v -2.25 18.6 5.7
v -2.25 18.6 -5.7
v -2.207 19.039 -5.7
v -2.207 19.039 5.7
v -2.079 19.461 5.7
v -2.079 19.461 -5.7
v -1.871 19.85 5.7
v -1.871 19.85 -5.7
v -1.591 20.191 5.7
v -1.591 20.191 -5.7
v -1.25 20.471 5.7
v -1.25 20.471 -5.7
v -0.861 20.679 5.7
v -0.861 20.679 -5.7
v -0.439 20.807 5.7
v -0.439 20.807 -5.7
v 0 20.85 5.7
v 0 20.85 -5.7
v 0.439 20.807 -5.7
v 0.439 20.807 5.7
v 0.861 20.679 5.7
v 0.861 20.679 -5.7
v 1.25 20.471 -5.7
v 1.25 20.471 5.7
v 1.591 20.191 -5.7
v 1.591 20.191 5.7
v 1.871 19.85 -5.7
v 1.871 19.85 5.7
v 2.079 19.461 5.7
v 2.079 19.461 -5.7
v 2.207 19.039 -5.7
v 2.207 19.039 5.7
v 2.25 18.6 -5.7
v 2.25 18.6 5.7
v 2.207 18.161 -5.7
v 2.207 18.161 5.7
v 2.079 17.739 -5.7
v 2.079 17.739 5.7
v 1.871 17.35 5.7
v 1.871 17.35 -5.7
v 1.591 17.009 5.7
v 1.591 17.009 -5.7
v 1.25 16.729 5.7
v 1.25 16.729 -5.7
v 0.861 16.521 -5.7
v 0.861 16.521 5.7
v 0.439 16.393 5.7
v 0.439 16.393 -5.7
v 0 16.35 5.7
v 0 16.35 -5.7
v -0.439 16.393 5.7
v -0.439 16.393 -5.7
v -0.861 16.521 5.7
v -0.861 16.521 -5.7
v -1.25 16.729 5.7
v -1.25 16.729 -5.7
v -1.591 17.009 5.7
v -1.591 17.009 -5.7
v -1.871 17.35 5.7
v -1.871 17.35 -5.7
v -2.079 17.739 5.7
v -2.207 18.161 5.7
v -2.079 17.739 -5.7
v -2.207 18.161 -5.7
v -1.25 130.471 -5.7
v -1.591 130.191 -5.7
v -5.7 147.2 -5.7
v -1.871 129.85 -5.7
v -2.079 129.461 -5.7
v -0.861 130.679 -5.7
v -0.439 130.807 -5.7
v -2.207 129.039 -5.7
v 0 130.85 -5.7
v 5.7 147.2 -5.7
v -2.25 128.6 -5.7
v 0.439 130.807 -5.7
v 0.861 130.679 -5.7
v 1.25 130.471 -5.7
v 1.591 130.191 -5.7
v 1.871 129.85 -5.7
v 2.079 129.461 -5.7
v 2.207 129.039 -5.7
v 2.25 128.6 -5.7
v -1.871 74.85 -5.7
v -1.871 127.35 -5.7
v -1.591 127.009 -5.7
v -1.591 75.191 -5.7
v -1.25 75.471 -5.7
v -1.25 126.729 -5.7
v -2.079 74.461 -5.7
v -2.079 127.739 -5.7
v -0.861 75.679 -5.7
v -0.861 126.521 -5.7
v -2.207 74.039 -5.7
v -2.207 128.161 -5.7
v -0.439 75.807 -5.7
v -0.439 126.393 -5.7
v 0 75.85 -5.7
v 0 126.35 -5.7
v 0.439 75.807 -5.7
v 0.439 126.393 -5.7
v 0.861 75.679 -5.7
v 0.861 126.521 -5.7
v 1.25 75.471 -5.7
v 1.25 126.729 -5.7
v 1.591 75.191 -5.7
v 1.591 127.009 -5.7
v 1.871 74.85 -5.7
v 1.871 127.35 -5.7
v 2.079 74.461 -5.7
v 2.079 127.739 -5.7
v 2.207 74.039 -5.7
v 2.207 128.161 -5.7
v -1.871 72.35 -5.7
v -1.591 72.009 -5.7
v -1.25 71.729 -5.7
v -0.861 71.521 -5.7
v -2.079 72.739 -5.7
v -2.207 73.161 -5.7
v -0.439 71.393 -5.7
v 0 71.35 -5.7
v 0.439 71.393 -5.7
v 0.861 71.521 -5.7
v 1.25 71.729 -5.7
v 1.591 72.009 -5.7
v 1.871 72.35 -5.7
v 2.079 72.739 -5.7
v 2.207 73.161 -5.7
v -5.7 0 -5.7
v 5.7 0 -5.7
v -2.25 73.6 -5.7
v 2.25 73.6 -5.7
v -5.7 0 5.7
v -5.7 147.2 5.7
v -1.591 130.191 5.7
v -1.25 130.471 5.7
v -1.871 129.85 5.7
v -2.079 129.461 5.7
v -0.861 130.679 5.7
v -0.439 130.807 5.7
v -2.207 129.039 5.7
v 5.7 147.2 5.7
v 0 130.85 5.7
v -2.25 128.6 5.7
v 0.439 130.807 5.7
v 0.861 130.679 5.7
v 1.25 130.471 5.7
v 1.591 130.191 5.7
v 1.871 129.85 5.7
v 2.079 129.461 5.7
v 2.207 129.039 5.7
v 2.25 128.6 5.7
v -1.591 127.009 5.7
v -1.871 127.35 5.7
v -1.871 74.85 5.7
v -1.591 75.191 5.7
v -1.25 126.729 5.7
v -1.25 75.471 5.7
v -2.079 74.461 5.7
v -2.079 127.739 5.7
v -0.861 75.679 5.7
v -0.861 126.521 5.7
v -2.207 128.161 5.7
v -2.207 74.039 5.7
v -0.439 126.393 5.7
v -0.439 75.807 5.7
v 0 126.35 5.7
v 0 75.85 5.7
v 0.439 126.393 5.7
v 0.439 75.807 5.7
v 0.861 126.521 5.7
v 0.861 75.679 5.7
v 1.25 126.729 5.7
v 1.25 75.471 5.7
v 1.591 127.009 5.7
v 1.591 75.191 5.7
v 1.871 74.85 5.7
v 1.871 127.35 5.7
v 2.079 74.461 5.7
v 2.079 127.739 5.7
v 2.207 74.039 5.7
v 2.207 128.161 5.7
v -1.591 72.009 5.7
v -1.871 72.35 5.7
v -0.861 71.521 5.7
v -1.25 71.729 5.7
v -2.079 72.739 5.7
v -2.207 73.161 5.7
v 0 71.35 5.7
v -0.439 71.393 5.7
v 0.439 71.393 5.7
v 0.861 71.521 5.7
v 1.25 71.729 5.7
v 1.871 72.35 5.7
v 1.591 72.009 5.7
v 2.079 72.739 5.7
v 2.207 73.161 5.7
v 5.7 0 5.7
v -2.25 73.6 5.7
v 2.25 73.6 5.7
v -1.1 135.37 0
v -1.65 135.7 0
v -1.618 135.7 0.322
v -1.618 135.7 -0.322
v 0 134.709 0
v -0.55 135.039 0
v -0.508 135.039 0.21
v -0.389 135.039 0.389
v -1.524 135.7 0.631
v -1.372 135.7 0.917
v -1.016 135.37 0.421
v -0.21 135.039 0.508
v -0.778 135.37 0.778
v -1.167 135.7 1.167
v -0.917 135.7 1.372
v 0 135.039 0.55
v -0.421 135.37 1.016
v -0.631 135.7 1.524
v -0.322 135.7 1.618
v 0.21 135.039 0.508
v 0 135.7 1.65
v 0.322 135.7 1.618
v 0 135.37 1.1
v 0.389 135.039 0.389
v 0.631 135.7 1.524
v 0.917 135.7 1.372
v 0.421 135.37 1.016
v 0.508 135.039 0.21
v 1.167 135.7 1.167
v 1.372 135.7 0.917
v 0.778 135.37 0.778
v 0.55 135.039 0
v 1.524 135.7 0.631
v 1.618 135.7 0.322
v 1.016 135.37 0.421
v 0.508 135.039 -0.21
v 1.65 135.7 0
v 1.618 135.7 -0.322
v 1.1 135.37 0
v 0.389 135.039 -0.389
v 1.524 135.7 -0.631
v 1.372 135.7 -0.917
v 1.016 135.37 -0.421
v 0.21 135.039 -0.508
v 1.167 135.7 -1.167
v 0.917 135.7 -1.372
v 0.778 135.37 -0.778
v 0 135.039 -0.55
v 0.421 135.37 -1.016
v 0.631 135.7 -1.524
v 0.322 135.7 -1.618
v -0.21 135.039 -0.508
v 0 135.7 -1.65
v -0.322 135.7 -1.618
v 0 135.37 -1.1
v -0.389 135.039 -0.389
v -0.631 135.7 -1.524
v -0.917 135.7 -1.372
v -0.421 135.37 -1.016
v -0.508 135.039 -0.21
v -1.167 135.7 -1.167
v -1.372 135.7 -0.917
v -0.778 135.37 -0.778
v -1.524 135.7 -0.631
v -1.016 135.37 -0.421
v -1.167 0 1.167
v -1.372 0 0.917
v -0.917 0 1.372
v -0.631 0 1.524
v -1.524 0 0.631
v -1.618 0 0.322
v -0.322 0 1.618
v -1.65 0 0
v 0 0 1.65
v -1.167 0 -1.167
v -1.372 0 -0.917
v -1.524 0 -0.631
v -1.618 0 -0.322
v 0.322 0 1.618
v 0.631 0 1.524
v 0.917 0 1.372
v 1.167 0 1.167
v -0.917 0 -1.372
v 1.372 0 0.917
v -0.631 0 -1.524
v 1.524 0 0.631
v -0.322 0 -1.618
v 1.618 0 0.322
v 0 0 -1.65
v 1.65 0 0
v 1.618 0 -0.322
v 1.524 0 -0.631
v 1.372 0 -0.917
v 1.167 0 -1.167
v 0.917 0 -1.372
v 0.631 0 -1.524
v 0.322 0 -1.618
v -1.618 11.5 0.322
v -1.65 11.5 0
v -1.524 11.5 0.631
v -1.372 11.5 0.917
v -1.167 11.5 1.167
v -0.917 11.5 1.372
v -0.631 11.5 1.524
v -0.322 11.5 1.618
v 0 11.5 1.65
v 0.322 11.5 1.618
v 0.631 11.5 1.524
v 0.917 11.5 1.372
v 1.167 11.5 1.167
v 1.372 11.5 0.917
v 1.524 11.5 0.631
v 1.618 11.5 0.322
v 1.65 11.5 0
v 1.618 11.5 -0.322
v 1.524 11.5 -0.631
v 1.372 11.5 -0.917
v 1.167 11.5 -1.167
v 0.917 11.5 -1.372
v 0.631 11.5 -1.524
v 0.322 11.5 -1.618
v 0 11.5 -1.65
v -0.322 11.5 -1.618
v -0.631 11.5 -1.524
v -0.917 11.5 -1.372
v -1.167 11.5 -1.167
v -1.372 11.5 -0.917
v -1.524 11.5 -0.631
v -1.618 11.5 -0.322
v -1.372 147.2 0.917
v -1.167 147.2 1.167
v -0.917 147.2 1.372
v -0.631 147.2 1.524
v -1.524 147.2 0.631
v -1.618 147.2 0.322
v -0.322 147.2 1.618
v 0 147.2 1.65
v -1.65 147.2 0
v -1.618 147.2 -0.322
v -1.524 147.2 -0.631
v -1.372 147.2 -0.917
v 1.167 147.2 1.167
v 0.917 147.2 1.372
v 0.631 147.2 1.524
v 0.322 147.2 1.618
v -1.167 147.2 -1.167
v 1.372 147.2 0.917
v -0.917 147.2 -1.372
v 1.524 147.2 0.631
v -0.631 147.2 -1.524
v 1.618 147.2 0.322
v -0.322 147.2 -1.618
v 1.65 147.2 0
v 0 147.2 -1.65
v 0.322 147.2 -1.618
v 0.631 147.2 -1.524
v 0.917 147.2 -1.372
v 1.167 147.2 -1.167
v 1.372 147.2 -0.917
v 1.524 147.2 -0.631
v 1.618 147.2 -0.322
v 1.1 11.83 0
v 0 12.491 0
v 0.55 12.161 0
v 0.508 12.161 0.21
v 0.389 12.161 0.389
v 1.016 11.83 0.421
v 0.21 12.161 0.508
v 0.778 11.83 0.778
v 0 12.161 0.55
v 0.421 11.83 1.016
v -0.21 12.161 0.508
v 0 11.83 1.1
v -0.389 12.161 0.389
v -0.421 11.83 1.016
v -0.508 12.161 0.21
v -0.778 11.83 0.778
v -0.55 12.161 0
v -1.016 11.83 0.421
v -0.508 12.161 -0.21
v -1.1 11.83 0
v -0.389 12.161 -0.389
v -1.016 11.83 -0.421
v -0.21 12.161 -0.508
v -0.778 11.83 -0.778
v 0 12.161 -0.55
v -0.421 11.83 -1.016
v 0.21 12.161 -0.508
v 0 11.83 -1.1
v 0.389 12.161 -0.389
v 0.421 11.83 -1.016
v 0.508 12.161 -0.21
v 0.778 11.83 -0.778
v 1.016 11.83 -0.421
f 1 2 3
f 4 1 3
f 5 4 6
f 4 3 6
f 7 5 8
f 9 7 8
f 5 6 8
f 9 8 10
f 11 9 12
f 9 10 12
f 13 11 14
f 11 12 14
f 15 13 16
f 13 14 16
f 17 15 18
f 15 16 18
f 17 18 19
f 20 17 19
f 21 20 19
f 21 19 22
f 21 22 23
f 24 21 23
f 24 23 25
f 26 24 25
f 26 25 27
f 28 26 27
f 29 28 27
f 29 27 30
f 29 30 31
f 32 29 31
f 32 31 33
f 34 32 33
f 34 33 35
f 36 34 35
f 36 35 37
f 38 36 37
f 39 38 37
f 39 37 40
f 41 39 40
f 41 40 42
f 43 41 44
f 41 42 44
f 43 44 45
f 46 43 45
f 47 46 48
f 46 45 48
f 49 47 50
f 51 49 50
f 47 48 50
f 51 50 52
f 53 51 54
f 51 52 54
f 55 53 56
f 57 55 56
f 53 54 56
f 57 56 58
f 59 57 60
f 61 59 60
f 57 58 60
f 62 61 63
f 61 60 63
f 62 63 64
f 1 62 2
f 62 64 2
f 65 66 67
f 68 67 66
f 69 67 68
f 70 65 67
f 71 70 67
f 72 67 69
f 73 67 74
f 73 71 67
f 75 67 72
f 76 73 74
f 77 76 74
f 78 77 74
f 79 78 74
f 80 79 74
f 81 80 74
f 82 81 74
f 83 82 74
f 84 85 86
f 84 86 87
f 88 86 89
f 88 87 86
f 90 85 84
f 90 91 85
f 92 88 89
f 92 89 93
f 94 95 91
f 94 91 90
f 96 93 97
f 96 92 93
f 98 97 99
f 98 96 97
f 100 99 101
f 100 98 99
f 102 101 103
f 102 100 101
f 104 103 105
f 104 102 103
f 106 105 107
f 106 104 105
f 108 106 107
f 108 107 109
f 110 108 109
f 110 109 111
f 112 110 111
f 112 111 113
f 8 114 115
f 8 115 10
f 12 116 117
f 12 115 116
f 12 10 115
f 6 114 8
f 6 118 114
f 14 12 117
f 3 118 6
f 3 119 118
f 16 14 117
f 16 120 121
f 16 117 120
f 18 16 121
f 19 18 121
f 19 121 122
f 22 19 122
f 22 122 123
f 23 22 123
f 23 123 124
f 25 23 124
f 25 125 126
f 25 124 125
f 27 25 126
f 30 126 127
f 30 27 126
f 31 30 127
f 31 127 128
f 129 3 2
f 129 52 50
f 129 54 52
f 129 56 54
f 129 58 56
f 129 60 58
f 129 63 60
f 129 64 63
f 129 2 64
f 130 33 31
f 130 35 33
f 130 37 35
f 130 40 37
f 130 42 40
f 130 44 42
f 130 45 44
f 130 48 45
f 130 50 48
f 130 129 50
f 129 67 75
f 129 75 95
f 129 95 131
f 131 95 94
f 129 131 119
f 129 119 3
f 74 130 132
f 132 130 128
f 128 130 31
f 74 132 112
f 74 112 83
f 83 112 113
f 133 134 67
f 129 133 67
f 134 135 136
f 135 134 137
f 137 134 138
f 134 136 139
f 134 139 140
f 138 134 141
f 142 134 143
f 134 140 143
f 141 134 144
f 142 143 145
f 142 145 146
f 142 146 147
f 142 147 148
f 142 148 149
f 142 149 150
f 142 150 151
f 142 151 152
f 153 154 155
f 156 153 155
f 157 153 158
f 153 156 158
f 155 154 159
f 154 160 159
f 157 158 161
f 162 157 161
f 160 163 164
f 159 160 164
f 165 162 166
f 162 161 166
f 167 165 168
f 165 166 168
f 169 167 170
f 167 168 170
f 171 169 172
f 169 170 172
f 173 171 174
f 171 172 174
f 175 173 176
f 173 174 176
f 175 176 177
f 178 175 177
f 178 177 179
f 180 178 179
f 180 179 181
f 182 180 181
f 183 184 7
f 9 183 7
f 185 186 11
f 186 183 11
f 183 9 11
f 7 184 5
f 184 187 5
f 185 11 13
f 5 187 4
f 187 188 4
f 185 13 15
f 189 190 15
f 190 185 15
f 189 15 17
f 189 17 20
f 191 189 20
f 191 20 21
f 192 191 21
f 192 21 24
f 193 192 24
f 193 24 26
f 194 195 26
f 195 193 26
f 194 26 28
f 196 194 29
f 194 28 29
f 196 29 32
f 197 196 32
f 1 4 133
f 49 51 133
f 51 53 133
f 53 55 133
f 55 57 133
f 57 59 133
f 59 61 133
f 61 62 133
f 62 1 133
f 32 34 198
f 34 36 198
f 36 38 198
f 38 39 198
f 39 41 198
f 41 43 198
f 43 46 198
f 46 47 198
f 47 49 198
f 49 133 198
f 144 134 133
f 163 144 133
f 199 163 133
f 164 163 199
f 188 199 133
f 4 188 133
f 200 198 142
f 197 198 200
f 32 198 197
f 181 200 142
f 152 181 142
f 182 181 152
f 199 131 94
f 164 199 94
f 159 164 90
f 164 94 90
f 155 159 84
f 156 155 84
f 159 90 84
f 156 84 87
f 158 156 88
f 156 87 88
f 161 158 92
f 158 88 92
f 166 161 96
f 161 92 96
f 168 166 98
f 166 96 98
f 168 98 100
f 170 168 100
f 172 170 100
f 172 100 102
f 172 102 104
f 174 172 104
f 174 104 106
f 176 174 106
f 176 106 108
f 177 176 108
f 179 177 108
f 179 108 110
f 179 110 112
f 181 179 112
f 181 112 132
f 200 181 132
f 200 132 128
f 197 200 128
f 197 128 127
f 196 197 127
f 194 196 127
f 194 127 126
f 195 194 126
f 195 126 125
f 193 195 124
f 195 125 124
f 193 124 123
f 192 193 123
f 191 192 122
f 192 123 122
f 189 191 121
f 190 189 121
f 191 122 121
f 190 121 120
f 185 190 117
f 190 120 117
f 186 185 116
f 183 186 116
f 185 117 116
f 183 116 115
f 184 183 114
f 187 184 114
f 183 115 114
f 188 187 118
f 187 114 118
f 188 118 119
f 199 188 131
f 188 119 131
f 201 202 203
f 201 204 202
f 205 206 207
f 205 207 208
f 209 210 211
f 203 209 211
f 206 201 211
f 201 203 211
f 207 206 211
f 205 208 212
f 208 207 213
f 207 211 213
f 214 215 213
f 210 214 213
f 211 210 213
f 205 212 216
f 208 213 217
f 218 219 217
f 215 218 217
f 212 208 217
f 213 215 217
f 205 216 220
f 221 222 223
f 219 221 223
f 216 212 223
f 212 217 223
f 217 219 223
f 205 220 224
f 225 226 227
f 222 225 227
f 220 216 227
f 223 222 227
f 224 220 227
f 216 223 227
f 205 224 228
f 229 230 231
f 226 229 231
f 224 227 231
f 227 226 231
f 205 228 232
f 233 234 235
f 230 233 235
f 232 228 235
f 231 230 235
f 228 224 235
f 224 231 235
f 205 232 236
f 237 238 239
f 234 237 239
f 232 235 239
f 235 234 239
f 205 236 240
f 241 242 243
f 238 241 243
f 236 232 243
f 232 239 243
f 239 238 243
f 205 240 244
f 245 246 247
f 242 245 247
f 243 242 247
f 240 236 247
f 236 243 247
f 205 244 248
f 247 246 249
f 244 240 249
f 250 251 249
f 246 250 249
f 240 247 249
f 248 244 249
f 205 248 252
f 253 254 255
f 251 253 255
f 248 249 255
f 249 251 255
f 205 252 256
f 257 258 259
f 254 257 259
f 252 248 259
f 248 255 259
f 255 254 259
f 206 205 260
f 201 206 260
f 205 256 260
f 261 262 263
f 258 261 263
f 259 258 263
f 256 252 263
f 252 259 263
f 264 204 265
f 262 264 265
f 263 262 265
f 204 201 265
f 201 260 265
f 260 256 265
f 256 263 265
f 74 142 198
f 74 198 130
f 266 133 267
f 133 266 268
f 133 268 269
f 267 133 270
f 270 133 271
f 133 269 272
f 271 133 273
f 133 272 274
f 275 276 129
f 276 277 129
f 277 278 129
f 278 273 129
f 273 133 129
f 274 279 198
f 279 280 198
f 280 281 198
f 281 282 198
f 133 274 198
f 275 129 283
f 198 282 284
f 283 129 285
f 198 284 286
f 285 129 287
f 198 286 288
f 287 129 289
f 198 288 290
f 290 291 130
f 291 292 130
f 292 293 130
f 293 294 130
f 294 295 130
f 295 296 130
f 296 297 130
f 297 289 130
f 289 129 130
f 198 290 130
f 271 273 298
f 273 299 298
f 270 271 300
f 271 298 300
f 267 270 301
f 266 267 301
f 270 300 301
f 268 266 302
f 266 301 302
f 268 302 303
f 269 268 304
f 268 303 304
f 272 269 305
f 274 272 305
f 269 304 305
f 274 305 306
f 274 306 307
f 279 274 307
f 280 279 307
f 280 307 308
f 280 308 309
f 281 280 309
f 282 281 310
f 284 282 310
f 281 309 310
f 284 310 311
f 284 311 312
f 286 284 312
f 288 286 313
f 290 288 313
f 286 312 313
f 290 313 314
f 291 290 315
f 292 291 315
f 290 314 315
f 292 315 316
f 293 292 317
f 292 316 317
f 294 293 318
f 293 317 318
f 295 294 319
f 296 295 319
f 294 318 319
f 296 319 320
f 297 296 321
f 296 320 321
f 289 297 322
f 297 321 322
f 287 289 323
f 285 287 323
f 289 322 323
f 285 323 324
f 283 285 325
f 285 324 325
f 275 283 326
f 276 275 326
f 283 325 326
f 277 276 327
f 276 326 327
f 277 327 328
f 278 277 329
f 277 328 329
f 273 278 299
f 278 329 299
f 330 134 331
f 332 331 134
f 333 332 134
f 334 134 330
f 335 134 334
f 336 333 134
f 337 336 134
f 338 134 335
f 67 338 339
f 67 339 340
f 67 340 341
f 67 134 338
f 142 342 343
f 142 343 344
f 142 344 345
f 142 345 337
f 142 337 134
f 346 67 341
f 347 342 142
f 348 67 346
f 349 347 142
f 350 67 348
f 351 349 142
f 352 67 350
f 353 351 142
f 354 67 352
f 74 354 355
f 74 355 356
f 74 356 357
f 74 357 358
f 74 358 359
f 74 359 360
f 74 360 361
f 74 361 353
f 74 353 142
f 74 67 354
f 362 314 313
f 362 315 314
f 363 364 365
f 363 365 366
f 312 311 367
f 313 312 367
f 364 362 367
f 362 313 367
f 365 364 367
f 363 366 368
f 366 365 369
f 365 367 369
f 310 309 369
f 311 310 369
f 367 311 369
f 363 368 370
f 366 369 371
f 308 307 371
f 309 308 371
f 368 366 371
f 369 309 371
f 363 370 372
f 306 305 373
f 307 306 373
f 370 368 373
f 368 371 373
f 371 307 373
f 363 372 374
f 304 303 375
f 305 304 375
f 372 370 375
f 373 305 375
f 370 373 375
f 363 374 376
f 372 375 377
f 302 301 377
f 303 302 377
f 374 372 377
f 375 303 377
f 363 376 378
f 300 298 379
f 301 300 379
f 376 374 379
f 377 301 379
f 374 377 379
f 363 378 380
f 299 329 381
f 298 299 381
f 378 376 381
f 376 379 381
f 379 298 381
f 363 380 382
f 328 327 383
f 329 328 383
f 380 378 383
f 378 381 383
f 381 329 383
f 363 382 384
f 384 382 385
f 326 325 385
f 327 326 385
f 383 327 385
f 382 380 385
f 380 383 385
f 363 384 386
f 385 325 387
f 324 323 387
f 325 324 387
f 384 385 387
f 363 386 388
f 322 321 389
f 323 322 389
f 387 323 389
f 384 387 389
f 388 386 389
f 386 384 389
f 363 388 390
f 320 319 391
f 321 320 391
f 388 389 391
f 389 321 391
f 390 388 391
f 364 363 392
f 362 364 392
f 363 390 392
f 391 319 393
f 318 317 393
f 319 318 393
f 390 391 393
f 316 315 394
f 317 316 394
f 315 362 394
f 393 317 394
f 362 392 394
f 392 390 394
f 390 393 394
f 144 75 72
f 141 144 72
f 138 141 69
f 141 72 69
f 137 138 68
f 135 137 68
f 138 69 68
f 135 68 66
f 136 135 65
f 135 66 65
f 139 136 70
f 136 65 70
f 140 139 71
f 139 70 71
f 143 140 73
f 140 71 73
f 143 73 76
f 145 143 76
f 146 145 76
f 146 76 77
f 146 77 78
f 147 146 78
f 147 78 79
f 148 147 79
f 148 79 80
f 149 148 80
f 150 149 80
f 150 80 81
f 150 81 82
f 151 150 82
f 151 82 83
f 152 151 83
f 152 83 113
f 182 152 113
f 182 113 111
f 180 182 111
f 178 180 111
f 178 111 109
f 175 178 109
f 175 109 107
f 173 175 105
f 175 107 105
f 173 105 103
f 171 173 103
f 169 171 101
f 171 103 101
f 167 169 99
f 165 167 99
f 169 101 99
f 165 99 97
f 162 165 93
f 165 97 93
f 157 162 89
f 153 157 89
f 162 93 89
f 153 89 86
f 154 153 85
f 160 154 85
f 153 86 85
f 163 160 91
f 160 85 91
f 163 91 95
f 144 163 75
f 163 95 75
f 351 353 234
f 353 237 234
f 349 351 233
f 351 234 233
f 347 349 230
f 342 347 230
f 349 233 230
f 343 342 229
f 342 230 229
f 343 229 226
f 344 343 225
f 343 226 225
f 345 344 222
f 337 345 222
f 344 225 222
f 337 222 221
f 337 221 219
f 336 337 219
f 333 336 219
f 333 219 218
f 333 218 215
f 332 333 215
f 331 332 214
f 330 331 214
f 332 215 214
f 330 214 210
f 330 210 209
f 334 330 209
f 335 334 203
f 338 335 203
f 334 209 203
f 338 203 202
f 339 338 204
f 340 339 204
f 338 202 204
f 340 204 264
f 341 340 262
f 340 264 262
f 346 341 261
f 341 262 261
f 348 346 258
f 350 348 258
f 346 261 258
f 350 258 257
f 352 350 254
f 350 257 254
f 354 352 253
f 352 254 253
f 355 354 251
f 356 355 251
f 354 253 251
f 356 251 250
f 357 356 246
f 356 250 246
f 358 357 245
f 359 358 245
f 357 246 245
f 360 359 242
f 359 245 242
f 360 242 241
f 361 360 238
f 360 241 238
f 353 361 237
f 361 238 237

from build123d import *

# Parameters (mm, degrees)
ESQUISSE1_W           = 11.4
ESQUISSE1_H           = 11.4
BOSS_EXTRU_1_DEPTH    = 147.2
TROU_TARAUD_M41_D     = 3.3
TROU_TARAUD_M41_DEPTH = 11.5
TROU_TARAUD_M41_TIP   = 0.991420021
TROU_TARAUD_M42_D     = 3.3
TROU_TARAUD_M42_DEPTH = 11.5
TROU_TARAUD_M42_TIP   = 0.991420021
D_GAGEMENT_M41_D      = 4.5


with BuildPart() as part:
    # Esquisse1 → Boss.-Extru.1 (new body)
    with BuildSketch(Plane(origin=(0, 0, 0), x_dir=(1, 0, 0), z_dir=(0, 1, 0))):
        Rectangle(ESQUISSE1_W, ESQUISSE1_H)
    extrude(amount=BOSS_EXTRU_1_DEPTH)

    # Trou taraudé M41
    with Locations(Plane(origin=(0, 147.2, 0), x_dir=(-1, 0, 0), z_dir=(0, 1, 0))):
        with Locations((0, 0)):
            Hole(TROU_TARAUD_M41_D / 2, depth=TROU_TARAUD_M41_DEPTH)
            with Locations((0, 0, -(TROU_TARAUD_M41_DEPTH + TROU_TARAUD_M41_TIP / 2))):  # 118° drill point
                Cone(0, TROU_TARAUD_M41_D / 2, TROU_TARAUD_M41_TIP, mode=Mode.SUBTRACT)

    # Trou taraudé M42
    with Locations(Plane.XZ):
        with Locations((0, 0)):
            Hole(TROU_TARAUD_M42_D / 2, depth=TROU_TARAUD_M42_DEPTH)
            with Locations((0, 0, -(TROU_TARAUD_M42_DEPTH + TROU_TARAUD_M42_TIP / 2))):  # 118° drill point
                Cone(0, TROU_TARAUD_M42_D / 2, TROU_TARAUD_M42_TIP, mode=Mode.SUBTRACT)

    # Dégagement M41 (through all)
    with Locations(Plane.XY.offset(5.7)):
        with Locations((0, 128.6), (0, 73.6), (0, 18.6)):
            Hole(D_GAGEMENT_M41_D / 2)


solid = part.part
